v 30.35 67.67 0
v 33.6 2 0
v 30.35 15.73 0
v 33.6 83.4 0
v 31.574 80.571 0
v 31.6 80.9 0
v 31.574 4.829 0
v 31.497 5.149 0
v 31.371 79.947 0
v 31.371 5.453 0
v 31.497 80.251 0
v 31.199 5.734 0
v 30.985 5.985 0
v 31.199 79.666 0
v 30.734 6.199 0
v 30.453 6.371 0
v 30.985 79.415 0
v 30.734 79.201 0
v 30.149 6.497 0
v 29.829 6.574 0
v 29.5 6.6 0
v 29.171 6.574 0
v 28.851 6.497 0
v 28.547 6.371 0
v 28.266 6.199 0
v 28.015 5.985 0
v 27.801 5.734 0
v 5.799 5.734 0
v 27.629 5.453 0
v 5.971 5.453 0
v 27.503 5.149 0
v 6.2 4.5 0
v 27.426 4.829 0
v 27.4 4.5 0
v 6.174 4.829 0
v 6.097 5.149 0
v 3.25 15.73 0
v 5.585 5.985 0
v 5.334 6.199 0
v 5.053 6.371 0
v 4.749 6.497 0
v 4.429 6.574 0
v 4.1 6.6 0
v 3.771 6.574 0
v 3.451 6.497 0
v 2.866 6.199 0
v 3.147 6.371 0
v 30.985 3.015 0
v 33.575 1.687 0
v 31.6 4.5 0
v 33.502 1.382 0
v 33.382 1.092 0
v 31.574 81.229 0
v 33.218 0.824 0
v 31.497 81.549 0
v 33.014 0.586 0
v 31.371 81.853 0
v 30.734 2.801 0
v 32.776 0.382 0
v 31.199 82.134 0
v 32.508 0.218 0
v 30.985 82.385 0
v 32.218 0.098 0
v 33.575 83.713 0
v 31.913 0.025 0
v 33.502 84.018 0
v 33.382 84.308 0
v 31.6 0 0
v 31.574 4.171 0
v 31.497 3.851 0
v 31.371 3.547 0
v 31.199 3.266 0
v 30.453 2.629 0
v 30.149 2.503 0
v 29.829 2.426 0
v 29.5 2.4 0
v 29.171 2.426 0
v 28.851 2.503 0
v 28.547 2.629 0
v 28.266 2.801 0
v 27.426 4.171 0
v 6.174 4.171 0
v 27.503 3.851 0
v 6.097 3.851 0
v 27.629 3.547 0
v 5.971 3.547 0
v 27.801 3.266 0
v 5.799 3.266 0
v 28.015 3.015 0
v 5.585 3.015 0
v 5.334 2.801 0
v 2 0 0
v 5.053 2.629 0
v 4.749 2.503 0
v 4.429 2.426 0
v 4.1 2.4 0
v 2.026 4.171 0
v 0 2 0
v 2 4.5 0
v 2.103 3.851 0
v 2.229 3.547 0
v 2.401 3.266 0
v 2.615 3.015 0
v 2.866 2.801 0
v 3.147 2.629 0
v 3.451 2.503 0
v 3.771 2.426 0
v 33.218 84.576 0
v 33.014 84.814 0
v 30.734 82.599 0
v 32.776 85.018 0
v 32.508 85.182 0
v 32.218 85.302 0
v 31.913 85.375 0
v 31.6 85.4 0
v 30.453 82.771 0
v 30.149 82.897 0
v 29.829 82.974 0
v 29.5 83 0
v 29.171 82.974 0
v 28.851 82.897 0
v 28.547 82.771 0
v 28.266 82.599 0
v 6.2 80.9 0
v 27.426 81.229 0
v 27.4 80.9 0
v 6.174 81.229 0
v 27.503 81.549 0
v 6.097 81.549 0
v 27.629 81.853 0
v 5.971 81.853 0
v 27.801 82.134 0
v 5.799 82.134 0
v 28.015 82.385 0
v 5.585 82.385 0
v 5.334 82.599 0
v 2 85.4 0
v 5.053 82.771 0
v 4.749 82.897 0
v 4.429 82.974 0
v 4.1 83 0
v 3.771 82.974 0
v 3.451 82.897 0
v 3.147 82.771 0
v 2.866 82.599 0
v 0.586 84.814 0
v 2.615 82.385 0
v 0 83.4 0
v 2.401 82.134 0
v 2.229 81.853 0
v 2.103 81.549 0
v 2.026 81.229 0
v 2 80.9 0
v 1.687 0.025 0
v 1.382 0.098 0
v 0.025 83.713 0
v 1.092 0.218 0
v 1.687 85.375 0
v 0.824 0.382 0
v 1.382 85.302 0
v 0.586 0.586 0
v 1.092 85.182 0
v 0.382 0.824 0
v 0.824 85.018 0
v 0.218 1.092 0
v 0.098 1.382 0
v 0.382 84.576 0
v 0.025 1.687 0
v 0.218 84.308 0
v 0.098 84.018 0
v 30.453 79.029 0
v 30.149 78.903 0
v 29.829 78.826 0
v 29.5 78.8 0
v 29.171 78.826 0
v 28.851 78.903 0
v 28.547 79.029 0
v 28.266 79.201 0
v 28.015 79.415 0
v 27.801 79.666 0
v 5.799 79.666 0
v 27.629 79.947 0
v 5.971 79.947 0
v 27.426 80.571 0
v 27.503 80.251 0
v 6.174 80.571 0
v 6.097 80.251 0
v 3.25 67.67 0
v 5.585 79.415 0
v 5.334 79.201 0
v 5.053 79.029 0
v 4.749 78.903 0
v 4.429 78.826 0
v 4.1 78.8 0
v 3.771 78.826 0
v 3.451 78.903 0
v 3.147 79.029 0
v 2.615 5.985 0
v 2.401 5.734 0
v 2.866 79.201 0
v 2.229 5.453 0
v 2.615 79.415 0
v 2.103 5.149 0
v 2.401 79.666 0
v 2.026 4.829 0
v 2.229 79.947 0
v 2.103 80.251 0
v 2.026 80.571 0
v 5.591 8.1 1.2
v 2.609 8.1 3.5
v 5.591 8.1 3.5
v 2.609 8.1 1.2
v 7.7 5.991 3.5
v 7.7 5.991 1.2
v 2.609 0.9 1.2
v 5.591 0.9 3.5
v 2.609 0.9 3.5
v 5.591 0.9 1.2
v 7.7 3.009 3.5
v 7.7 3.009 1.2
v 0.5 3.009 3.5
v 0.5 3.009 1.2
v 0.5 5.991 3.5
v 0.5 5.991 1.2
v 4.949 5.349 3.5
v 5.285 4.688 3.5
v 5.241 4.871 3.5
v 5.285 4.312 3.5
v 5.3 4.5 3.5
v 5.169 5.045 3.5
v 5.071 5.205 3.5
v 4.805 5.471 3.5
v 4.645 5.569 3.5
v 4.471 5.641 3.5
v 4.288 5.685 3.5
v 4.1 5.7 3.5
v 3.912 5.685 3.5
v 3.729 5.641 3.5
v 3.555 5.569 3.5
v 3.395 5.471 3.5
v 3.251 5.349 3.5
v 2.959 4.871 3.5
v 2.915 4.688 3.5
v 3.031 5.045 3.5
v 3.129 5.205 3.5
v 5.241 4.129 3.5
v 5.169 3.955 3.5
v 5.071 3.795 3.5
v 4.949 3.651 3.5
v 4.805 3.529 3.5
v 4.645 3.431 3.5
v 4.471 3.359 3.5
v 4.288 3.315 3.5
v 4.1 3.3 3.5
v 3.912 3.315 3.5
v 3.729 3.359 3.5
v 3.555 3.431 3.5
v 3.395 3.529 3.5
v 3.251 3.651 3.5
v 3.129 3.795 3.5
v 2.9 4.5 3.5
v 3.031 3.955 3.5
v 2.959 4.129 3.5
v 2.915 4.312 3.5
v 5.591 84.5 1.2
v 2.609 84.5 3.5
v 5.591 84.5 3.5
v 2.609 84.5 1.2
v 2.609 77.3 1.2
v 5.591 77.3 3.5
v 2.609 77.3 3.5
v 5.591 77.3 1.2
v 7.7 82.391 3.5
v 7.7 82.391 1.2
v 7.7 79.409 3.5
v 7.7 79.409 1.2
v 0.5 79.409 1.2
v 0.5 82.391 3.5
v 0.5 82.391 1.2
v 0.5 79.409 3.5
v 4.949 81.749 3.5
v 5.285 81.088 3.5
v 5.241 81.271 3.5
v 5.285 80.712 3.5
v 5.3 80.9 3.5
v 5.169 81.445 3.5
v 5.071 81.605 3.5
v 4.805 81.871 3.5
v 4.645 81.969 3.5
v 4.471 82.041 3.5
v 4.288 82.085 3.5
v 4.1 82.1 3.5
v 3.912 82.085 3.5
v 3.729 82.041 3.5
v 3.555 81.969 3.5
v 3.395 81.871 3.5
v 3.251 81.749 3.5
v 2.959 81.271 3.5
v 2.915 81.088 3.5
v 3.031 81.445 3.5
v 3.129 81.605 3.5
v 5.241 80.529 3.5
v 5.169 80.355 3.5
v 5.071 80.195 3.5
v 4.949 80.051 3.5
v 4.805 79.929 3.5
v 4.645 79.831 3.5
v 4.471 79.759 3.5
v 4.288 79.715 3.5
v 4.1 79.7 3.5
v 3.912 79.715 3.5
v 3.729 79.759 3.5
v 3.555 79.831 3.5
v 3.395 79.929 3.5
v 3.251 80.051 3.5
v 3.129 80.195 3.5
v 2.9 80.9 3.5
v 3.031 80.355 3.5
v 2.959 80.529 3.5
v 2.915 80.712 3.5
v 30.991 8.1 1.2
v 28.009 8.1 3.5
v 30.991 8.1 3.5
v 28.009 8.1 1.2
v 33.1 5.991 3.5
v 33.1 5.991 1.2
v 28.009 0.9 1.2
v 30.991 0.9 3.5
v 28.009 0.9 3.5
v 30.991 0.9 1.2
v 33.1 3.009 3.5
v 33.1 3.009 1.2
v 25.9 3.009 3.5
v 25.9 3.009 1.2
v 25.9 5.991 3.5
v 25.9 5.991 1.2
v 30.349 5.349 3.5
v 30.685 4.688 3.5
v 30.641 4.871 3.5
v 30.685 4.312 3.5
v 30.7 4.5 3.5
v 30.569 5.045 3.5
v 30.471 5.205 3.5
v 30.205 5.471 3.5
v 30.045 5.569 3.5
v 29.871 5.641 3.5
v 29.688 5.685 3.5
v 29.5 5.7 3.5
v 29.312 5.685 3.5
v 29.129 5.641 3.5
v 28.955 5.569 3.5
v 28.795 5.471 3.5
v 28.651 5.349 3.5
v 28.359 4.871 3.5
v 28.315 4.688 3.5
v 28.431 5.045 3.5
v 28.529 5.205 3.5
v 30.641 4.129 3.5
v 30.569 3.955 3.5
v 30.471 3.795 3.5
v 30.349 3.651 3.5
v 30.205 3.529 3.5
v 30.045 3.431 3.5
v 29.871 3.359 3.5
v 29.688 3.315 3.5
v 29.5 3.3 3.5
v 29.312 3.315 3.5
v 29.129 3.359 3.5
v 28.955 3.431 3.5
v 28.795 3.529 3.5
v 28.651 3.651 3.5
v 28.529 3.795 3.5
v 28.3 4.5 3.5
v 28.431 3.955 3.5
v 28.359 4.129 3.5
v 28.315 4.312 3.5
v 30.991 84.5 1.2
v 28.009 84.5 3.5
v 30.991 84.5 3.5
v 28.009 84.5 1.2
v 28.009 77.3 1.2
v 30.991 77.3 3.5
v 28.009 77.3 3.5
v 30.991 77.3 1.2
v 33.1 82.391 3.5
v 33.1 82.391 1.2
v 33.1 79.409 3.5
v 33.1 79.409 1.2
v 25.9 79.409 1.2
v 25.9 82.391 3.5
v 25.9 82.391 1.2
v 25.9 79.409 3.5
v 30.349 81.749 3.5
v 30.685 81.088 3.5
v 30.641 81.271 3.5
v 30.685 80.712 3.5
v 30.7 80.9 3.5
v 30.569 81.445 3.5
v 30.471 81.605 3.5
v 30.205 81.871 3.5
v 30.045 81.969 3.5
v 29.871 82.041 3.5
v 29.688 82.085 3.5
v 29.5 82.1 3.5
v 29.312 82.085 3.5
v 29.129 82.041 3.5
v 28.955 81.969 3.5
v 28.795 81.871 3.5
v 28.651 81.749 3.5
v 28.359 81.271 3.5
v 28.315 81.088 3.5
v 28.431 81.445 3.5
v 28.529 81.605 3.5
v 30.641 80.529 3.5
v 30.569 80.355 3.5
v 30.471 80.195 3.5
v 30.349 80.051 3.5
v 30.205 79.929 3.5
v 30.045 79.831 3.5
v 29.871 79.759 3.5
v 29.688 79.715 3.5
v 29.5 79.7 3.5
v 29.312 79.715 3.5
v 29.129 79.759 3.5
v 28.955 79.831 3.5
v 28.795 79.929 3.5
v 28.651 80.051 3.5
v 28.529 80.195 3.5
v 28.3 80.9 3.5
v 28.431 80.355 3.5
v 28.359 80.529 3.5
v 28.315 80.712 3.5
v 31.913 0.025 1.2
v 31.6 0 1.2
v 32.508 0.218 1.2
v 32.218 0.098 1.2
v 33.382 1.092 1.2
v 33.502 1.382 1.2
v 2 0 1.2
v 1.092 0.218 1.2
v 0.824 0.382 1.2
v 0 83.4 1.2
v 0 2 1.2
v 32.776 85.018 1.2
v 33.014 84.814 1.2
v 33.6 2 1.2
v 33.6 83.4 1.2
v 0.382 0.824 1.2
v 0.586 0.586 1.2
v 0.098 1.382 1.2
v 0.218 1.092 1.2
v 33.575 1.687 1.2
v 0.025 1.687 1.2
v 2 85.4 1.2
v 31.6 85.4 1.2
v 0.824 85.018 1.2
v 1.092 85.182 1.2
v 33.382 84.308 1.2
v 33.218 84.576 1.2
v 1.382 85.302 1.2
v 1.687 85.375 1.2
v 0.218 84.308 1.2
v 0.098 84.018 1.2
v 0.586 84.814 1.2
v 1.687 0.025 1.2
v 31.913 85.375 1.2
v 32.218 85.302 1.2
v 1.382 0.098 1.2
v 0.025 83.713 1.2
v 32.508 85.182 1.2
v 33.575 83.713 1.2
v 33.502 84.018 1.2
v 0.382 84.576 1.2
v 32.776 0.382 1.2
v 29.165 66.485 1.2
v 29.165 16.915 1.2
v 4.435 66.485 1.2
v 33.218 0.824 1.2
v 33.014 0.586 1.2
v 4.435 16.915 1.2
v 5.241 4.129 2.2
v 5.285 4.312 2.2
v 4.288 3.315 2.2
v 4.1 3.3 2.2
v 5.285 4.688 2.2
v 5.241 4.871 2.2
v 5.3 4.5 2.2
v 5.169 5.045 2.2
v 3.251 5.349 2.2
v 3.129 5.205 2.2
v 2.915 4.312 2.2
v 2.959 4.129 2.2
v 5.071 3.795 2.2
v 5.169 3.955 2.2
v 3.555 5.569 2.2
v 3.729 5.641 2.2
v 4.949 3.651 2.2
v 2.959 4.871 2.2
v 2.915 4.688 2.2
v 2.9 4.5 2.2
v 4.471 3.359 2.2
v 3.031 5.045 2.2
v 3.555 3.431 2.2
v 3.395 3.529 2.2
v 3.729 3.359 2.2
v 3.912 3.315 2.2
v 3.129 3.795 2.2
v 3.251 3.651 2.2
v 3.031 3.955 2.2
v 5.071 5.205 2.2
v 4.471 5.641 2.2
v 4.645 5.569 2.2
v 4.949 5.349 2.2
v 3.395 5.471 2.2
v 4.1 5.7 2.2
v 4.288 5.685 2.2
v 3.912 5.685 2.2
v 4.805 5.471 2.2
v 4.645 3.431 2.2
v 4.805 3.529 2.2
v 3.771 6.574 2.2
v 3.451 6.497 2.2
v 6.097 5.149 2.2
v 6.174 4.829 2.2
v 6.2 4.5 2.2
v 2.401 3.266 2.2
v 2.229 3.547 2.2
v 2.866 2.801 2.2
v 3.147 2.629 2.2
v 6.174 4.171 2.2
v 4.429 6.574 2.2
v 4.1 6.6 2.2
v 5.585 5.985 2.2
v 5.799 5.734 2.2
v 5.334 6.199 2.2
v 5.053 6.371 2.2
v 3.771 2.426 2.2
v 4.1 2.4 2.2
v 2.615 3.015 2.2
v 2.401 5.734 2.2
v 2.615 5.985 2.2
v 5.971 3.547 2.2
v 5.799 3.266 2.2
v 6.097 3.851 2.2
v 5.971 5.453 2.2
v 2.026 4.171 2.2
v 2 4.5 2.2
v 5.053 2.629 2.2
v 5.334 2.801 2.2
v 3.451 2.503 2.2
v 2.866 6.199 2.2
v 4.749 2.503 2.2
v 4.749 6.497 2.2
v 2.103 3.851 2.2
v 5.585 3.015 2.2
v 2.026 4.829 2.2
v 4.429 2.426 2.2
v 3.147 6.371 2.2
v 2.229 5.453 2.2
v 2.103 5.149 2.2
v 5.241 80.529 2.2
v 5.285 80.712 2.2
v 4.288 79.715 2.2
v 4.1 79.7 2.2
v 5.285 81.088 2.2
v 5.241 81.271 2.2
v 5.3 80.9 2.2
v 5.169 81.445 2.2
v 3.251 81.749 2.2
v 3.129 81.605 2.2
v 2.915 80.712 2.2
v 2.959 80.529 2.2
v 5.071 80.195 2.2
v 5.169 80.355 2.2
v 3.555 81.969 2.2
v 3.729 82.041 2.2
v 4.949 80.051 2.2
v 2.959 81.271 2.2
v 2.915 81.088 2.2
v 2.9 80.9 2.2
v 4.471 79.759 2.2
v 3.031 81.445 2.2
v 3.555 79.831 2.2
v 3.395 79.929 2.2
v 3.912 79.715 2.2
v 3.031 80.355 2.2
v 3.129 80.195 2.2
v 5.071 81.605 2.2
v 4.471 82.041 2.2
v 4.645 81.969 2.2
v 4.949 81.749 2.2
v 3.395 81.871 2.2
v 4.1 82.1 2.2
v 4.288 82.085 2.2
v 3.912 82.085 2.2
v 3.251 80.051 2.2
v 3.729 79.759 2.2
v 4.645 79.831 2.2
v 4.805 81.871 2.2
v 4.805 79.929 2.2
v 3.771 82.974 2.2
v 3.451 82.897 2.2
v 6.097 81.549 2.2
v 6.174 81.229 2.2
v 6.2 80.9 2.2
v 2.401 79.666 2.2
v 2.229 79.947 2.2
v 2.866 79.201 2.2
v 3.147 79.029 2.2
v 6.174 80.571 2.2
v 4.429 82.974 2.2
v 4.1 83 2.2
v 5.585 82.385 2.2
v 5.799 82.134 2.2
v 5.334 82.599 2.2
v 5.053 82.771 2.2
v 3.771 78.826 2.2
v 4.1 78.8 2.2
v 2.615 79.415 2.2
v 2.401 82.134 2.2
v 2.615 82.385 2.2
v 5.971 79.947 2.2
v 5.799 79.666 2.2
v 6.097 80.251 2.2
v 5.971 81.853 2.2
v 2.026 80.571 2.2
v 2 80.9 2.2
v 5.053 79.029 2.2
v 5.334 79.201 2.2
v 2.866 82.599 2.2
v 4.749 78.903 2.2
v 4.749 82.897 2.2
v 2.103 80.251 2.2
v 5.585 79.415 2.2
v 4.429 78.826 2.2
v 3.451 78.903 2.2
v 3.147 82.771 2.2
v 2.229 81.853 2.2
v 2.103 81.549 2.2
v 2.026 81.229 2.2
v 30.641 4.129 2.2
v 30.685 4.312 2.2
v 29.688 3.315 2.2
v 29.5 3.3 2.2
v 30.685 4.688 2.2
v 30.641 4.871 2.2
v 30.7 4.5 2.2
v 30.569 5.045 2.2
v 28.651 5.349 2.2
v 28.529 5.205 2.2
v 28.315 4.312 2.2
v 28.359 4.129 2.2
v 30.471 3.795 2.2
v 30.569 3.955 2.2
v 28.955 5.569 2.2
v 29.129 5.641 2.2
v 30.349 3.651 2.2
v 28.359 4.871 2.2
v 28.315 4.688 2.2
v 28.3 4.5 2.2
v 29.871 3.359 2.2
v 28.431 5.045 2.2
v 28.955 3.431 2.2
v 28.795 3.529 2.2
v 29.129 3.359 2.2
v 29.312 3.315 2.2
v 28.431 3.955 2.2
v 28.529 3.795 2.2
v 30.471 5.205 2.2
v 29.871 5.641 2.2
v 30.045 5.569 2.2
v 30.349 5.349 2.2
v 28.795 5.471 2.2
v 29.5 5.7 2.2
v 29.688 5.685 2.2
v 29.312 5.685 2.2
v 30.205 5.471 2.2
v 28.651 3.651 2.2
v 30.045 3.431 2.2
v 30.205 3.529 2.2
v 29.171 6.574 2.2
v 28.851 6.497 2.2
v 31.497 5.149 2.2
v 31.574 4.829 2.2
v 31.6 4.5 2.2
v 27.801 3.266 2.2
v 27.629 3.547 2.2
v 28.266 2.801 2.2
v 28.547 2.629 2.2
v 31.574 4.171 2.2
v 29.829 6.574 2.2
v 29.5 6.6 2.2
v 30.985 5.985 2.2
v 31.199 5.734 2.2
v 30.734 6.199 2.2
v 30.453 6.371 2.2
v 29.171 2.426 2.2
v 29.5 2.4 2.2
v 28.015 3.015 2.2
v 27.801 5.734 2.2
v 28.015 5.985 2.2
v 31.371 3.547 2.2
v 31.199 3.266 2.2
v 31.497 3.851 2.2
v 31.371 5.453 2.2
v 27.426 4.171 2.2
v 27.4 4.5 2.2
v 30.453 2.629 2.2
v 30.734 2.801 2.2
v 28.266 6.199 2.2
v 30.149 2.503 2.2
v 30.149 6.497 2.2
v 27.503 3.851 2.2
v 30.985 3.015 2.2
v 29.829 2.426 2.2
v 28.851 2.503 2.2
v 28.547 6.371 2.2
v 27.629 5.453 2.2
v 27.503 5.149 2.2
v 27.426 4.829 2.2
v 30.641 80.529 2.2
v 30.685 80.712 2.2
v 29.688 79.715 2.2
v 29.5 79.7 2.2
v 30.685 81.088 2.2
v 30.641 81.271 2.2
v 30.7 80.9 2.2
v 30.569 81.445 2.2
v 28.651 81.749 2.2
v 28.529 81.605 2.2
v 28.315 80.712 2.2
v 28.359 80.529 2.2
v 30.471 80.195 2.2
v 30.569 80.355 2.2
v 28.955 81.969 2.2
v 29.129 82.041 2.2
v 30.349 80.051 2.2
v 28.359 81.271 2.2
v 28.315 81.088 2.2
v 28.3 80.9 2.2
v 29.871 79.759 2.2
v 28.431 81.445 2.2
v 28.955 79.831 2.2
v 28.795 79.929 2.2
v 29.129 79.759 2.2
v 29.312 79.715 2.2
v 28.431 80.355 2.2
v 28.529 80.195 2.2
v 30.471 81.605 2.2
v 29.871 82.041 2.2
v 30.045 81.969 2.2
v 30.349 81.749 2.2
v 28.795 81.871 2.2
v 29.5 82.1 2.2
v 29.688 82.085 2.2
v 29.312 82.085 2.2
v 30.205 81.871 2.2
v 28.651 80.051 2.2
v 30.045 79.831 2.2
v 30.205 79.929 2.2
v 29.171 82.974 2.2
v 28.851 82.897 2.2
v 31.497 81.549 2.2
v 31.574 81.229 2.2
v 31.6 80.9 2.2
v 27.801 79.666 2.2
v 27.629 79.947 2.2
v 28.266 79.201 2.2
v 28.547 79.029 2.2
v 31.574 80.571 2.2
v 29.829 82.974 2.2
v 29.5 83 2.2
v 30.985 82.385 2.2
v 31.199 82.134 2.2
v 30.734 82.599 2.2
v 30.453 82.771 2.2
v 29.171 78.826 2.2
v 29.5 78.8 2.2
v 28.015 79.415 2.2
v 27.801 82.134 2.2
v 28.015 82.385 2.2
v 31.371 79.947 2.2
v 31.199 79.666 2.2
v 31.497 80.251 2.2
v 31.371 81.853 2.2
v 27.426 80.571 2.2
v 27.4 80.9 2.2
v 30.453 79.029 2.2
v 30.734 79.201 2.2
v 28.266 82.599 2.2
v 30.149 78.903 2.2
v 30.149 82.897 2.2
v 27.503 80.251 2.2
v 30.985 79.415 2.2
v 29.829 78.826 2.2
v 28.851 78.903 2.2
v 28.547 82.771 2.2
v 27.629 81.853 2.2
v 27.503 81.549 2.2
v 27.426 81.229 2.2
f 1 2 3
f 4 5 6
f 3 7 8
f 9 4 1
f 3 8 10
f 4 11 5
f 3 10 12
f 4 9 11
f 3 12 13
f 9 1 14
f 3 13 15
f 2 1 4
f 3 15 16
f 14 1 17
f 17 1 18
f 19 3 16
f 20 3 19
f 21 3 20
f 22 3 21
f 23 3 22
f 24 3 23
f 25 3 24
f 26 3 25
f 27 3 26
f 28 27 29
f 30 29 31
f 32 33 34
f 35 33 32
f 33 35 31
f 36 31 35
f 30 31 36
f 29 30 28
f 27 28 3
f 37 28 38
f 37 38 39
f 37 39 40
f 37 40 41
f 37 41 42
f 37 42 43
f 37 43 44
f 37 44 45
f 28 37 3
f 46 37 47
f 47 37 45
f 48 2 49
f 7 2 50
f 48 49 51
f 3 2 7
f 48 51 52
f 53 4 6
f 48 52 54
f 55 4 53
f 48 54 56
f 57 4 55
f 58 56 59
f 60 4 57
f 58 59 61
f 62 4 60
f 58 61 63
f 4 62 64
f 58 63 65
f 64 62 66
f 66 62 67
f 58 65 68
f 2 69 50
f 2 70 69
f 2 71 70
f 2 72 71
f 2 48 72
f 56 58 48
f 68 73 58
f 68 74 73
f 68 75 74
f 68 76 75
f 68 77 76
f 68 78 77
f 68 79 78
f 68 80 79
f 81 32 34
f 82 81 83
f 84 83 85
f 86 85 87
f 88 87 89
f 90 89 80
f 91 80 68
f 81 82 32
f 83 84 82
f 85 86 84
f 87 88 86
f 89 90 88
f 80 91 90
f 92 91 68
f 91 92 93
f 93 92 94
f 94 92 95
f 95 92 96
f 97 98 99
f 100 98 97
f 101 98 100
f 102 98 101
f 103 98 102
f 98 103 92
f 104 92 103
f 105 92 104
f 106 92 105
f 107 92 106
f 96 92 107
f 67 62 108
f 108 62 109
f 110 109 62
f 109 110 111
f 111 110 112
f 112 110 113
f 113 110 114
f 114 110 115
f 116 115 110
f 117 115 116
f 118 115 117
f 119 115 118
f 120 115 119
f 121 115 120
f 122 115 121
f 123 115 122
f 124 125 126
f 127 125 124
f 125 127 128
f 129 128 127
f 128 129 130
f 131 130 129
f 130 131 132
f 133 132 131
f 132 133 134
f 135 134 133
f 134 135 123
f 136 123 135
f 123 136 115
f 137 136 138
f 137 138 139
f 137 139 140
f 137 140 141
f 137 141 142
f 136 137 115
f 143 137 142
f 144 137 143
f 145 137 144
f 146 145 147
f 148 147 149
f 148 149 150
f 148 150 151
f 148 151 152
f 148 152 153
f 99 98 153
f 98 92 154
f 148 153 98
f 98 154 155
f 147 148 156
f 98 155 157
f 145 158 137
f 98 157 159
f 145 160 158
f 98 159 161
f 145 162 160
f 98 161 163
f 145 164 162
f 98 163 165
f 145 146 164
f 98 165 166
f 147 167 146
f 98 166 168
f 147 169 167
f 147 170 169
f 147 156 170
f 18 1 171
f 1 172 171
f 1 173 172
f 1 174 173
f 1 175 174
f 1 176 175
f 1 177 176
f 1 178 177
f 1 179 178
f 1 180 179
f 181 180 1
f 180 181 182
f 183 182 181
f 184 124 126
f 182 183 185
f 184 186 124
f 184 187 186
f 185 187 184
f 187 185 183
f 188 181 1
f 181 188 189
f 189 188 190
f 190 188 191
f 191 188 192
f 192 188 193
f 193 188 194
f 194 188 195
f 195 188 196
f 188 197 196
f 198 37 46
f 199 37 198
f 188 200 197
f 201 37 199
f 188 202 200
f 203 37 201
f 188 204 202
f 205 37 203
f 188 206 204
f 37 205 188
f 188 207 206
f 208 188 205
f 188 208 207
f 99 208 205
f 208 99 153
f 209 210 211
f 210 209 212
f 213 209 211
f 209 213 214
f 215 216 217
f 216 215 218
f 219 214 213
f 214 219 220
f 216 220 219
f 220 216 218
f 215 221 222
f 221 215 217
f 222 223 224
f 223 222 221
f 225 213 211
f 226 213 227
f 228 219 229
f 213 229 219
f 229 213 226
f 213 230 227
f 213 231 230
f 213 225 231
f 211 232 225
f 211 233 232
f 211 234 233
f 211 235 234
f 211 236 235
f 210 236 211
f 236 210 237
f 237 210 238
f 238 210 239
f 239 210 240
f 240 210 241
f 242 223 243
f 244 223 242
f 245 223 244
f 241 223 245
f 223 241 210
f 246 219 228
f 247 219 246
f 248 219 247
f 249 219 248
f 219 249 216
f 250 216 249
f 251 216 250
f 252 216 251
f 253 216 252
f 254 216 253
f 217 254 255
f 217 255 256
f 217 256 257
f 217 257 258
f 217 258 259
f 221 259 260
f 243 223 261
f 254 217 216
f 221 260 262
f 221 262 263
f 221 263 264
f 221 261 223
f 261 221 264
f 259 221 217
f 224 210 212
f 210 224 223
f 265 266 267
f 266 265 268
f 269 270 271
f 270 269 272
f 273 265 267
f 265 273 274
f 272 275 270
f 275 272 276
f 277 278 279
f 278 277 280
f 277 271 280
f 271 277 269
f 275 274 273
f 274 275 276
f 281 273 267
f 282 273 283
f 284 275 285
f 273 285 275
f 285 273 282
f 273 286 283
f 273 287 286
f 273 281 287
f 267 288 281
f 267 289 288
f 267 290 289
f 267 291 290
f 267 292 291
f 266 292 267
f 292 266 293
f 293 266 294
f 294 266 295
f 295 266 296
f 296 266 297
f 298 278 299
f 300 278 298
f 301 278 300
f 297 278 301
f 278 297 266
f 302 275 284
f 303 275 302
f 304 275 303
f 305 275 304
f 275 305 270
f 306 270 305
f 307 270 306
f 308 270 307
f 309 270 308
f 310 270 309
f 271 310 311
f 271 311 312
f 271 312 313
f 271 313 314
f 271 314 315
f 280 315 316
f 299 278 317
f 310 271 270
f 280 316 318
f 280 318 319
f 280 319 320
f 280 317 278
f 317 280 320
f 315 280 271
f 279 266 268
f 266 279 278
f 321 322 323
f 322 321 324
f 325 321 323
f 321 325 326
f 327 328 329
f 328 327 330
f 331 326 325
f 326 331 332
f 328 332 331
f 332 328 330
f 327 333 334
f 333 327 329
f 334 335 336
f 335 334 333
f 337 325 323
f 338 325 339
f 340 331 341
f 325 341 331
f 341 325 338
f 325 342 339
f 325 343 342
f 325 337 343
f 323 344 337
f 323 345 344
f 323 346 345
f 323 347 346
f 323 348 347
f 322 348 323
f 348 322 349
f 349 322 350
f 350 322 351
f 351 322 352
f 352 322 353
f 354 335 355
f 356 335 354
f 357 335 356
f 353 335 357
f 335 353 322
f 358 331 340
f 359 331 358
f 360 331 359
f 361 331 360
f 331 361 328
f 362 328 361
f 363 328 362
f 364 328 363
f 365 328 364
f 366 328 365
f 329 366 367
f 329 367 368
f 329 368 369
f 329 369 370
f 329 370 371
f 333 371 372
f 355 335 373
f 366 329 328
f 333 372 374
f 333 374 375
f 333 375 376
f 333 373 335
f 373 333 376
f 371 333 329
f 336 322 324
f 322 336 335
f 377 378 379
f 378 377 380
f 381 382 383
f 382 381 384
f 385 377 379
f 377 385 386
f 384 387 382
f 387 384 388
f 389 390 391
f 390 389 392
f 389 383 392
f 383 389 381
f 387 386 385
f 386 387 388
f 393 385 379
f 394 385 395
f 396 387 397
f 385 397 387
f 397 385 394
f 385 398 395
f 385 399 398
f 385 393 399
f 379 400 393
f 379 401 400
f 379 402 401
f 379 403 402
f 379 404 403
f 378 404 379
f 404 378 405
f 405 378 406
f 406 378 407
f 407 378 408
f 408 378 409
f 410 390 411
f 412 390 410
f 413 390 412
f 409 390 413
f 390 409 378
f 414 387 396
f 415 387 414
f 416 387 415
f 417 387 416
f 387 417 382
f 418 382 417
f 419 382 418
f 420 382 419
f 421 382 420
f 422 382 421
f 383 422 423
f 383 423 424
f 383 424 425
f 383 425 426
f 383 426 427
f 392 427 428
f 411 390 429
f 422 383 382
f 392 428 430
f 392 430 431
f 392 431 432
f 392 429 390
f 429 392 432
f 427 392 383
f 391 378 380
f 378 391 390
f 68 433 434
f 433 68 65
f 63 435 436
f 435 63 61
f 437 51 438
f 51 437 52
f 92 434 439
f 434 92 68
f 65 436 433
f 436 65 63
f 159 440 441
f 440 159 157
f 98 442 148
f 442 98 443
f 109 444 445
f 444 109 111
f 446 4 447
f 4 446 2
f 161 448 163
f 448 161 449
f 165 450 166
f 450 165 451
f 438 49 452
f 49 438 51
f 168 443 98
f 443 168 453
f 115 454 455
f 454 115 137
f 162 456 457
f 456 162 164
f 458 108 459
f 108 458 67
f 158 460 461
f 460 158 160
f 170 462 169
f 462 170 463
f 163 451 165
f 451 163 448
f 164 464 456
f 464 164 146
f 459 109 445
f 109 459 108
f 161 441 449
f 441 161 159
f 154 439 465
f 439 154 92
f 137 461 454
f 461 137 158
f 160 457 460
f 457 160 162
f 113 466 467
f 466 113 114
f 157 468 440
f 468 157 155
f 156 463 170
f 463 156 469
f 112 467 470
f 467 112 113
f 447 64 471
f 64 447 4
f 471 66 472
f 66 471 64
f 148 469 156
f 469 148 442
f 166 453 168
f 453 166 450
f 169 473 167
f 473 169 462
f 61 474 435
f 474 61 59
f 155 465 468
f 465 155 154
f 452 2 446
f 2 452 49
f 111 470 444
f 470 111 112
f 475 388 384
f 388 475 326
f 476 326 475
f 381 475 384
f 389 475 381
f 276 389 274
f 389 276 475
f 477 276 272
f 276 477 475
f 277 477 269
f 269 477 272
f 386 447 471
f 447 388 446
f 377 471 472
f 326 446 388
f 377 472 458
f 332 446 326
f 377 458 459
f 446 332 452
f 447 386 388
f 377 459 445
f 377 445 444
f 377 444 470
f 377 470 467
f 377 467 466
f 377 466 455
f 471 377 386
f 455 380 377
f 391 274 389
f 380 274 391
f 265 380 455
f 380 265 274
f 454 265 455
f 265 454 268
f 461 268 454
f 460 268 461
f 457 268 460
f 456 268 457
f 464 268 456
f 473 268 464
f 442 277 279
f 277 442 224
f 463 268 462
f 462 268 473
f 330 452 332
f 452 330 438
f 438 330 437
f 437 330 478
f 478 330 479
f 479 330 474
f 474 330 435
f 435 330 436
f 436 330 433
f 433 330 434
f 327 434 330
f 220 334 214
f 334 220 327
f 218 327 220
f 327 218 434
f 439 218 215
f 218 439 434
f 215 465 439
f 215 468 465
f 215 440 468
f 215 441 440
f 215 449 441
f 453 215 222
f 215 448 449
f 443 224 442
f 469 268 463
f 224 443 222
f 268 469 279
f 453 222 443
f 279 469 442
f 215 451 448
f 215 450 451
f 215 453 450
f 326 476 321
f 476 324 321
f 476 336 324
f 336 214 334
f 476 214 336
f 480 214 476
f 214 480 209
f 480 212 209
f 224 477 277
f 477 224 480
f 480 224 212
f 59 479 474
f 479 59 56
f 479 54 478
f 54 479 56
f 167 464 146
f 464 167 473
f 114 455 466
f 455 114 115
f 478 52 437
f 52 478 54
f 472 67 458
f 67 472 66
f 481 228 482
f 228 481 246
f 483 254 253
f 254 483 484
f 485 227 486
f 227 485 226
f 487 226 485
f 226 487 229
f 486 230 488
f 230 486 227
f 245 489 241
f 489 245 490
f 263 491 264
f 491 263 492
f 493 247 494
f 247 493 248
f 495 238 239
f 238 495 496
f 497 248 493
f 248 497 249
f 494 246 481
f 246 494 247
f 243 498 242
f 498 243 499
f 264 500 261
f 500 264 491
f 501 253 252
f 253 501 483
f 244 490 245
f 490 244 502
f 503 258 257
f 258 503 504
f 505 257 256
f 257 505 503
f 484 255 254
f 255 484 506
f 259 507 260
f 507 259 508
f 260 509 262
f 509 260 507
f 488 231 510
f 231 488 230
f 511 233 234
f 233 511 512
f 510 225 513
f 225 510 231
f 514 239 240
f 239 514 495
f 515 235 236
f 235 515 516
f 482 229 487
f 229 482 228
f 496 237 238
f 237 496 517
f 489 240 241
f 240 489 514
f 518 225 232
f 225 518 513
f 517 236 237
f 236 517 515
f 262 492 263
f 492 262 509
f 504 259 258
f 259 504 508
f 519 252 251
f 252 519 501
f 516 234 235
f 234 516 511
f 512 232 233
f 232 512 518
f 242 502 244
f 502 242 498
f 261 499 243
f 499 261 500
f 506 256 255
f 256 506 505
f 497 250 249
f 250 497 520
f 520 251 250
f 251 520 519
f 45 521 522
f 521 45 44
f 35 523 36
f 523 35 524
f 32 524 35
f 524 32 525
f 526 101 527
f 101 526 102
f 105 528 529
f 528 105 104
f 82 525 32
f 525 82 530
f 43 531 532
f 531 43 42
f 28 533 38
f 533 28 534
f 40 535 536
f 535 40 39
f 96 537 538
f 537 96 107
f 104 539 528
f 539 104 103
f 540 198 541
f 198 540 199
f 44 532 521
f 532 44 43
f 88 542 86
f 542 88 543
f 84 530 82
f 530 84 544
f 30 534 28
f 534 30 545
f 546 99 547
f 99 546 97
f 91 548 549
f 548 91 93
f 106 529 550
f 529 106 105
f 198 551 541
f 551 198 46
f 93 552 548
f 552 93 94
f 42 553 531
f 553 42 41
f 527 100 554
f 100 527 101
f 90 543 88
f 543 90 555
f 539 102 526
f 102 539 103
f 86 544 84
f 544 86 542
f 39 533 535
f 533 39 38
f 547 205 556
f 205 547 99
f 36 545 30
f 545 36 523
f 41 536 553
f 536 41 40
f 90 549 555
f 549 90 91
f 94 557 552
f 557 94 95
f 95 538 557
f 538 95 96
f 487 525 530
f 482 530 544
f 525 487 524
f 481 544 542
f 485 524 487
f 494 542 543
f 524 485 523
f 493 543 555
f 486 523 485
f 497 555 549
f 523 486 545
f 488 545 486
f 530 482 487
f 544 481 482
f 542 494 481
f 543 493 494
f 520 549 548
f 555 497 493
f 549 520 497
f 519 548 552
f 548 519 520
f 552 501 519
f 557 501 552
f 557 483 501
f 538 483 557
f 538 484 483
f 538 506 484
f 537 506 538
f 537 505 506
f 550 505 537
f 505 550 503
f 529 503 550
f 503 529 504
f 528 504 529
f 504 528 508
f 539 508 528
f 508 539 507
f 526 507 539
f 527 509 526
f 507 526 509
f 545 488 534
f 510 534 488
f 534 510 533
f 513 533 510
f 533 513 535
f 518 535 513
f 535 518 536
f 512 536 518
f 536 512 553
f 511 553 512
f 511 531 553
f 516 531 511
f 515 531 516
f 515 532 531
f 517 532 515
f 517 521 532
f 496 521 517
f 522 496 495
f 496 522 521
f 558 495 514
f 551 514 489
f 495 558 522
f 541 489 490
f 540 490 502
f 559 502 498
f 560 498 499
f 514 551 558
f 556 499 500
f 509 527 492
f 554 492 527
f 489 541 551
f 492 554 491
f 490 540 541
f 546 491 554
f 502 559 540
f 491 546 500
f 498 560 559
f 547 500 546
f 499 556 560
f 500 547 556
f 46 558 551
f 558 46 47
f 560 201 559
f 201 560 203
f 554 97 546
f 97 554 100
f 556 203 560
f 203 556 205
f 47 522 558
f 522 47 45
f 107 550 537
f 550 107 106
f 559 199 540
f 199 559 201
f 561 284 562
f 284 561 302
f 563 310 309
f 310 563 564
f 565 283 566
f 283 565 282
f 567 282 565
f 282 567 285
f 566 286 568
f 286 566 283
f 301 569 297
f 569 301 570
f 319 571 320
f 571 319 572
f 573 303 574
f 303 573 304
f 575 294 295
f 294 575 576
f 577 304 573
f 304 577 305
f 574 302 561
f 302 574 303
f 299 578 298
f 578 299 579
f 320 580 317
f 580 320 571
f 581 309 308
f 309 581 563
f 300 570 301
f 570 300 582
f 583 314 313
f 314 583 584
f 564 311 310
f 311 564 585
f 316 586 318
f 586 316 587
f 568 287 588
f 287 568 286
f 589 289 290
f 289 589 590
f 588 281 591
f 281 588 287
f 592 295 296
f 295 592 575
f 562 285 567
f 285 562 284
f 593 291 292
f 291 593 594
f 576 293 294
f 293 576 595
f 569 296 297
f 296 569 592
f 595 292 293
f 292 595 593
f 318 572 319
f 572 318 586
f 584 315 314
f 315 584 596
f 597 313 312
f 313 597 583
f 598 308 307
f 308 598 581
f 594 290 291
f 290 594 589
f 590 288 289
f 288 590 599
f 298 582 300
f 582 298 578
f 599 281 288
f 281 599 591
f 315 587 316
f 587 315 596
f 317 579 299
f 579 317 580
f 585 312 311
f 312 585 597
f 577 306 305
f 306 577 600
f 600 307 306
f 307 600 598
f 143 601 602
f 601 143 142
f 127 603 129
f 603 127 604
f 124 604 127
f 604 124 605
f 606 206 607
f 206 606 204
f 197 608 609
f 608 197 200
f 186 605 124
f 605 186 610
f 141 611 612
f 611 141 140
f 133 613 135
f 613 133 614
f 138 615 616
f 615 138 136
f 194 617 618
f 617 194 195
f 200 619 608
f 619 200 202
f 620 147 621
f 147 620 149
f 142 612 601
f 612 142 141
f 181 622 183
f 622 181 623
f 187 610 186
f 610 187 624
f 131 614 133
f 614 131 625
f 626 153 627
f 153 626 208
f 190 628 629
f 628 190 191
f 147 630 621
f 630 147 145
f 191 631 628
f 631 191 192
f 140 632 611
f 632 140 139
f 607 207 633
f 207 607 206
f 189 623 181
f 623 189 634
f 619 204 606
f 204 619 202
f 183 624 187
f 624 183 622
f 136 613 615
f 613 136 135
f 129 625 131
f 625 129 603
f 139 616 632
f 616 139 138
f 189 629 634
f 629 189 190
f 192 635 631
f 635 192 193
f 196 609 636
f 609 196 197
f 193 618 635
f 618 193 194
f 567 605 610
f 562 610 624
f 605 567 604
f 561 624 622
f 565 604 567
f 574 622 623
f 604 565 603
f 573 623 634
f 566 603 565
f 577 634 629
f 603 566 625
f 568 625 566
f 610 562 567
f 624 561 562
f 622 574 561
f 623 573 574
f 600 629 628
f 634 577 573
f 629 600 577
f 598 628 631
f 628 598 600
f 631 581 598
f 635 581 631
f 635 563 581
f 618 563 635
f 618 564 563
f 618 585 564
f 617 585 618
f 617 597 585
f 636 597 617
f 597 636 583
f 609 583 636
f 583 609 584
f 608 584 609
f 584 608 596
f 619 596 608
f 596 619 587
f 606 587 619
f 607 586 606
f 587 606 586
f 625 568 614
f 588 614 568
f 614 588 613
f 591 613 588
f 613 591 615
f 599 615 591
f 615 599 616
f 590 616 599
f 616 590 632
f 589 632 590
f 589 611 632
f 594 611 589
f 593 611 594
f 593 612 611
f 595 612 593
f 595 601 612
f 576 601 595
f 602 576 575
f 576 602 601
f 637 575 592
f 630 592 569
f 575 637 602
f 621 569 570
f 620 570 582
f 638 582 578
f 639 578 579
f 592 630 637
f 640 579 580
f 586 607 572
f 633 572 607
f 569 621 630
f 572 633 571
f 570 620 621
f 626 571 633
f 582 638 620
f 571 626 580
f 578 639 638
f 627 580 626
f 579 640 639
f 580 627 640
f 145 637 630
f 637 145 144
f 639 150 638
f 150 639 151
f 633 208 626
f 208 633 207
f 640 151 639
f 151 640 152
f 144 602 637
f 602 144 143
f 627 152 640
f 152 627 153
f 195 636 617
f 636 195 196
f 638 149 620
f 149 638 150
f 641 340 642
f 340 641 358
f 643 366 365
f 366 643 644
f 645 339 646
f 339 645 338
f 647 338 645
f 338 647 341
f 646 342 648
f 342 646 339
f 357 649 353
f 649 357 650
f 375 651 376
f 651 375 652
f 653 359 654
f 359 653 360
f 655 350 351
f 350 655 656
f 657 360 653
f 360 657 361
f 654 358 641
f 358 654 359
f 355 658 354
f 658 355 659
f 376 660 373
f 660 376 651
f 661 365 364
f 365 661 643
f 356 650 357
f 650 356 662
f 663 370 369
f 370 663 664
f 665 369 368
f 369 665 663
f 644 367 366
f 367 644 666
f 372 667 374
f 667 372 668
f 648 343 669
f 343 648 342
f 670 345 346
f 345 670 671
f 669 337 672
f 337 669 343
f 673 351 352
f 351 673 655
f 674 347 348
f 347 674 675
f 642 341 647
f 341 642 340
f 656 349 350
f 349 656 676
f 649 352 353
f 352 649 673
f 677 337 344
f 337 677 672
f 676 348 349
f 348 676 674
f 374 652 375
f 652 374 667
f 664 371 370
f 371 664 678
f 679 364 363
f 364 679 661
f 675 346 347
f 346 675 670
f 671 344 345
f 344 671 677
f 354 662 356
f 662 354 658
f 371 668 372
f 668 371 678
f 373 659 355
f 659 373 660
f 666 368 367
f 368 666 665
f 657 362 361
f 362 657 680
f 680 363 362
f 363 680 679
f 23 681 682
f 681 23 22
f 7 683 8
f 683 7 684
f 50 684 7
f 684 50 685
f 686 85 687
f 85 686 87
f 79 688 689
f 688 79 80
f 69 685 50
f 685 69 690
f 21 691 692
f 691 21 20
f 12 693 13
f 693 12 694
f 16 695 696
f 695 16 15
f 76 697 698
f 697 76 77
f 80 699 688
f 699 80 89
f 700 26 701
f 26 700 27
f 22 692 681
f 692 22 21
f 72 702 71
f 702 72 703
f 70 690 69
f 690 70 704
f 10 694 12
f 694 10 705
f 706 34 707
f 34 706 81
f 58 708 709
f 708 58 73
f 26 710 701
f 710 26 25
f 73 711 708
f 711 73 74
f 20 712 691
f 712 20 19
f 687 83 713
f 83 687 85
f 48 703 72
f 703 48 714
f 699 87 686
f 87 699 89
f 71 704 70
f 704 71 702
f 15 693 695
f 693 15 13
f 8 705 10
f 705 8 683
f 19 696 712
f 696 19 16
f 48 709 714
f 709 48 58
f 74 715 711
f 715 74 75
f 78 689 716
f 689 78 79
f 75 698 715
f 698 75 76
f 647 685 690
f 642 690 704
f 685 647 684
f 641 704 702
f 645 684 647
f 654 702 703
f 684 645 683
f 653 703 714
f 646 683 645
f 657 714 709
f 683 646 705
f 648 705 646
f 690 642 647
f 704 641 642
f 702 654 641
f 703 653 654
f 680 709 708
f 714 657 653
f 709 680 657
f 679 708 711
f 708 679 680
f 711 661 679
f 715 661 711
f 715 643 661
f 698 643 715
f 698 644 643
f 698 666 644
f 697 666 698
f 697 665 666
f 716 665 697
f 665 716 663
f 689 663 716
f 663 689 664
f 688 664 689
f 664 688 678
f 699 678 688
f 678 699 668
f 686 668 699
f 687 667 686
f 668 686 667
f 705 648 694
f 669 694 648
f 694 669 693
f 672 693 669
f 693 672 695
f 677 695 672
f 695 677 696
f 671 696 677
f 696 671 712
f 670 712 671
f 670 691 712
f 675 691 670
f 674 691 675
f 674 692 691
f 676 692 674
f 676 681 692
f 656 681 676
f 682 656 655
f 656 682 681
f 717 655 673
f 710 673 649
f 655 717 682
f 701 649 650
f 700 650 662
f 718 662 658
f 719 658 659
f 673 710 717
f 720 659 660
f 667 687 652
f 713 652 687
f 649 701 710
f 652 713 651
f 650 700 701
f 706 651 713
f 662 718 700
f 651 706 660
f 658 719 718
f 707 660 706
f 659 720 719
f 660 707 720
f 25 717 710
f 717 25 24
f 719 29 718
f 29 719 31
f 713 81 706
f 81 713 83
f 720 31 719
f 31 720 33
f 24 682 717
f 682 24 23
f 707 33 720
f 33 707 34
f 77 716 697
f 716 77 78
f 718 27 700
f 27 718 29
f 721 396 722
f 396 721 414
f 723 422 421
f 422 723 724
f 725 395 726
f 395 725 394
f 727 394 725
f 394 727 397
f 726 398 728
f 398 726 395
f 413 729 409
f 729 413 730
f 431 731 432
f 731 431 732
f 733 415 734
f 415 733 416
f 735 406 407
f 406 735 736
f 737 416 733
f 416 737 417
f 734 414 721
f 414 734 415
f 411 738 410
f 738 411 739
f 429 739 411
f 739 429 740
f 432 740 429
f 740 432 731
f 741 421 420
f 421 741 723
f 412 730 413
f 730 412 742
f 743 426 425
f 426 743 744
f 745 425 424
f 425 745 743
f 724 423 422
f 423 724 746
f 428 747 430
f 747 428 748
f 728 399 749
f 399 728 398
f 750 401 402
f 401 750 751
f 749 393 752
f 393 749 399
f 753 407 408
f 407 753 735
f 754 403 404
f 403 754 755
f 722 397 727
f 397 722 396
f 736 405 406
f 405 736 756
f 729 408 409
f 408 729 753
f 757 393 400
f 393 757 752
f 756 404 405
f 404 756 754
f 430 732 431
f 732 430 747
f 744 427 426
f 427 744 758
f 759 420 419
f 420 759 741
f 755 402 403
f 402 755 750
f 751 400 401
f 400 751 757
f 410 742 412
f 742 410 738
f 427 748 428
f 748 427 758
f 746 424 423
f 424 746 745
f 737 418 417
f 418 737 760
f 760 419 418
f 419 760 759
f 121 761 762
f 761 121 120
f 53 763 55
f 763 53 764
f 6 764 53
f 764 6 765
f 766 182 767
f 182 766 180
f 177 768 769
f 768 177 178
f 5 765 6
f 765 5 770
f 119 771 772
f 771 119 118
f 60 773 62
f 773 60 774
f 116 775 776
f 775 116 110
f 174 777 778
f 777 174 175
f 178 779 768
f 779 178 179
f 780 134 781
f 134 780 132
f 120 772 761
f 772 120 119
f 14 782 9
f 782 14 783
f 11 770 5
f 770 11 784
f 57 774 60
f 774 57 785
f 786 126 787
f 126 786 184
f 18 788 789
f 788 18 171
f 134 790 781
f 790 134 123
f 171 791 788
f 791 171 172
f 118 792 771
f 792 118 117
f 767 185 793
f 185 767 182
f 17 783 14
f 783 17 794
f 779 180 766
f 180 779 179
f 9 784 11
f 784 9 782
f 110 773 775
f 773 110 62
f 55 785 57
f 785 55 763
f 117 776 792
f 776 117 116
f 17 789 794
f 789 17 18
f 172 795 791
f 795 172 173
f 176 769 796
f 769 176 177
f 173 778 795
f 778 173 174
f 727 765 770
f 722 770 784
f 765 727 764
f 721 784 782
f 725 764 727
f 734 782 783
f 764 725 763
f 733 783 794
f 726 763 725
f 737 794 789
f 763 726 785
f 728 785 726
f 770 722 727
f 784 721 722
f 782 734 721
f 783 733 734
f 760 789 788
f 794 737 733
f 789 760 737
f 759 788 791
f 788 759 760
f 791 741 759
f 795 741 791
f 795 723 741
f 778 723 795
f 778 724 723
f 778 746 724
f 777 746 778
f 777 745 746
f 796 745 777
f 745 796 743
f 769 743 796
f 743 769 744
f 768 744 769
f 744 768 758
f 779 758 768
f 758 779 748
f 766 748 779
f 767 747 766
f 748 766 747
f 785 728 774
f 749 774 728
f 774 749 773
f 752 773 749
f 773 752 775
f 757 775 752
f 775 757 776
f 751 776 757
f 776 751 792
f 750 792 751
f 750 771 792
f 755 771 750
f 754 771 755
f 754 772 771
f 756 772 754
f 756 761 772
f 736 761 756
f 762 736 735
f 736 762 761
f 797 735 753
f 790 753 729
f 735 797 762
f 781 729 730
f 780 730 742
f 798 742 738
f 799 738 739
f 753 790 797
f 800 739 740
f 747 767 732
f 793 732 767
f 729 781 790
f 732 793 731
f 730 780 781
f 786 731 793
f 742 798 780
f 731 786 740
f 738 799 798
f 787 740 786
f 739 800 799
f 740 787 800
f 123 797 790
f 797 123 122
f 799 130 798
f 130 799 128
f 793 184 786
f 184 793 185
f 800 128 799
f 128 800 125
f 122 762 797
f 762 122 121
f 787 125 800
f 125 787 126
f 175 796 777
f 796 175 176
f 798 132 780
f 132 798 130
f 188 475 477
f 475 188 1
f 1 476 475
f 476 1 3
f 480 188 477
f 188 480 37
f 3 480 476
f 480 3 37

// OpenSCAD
include <../lib/kobo-meshcore-case-lib.scad>;
$fn = 40;
bezel();
